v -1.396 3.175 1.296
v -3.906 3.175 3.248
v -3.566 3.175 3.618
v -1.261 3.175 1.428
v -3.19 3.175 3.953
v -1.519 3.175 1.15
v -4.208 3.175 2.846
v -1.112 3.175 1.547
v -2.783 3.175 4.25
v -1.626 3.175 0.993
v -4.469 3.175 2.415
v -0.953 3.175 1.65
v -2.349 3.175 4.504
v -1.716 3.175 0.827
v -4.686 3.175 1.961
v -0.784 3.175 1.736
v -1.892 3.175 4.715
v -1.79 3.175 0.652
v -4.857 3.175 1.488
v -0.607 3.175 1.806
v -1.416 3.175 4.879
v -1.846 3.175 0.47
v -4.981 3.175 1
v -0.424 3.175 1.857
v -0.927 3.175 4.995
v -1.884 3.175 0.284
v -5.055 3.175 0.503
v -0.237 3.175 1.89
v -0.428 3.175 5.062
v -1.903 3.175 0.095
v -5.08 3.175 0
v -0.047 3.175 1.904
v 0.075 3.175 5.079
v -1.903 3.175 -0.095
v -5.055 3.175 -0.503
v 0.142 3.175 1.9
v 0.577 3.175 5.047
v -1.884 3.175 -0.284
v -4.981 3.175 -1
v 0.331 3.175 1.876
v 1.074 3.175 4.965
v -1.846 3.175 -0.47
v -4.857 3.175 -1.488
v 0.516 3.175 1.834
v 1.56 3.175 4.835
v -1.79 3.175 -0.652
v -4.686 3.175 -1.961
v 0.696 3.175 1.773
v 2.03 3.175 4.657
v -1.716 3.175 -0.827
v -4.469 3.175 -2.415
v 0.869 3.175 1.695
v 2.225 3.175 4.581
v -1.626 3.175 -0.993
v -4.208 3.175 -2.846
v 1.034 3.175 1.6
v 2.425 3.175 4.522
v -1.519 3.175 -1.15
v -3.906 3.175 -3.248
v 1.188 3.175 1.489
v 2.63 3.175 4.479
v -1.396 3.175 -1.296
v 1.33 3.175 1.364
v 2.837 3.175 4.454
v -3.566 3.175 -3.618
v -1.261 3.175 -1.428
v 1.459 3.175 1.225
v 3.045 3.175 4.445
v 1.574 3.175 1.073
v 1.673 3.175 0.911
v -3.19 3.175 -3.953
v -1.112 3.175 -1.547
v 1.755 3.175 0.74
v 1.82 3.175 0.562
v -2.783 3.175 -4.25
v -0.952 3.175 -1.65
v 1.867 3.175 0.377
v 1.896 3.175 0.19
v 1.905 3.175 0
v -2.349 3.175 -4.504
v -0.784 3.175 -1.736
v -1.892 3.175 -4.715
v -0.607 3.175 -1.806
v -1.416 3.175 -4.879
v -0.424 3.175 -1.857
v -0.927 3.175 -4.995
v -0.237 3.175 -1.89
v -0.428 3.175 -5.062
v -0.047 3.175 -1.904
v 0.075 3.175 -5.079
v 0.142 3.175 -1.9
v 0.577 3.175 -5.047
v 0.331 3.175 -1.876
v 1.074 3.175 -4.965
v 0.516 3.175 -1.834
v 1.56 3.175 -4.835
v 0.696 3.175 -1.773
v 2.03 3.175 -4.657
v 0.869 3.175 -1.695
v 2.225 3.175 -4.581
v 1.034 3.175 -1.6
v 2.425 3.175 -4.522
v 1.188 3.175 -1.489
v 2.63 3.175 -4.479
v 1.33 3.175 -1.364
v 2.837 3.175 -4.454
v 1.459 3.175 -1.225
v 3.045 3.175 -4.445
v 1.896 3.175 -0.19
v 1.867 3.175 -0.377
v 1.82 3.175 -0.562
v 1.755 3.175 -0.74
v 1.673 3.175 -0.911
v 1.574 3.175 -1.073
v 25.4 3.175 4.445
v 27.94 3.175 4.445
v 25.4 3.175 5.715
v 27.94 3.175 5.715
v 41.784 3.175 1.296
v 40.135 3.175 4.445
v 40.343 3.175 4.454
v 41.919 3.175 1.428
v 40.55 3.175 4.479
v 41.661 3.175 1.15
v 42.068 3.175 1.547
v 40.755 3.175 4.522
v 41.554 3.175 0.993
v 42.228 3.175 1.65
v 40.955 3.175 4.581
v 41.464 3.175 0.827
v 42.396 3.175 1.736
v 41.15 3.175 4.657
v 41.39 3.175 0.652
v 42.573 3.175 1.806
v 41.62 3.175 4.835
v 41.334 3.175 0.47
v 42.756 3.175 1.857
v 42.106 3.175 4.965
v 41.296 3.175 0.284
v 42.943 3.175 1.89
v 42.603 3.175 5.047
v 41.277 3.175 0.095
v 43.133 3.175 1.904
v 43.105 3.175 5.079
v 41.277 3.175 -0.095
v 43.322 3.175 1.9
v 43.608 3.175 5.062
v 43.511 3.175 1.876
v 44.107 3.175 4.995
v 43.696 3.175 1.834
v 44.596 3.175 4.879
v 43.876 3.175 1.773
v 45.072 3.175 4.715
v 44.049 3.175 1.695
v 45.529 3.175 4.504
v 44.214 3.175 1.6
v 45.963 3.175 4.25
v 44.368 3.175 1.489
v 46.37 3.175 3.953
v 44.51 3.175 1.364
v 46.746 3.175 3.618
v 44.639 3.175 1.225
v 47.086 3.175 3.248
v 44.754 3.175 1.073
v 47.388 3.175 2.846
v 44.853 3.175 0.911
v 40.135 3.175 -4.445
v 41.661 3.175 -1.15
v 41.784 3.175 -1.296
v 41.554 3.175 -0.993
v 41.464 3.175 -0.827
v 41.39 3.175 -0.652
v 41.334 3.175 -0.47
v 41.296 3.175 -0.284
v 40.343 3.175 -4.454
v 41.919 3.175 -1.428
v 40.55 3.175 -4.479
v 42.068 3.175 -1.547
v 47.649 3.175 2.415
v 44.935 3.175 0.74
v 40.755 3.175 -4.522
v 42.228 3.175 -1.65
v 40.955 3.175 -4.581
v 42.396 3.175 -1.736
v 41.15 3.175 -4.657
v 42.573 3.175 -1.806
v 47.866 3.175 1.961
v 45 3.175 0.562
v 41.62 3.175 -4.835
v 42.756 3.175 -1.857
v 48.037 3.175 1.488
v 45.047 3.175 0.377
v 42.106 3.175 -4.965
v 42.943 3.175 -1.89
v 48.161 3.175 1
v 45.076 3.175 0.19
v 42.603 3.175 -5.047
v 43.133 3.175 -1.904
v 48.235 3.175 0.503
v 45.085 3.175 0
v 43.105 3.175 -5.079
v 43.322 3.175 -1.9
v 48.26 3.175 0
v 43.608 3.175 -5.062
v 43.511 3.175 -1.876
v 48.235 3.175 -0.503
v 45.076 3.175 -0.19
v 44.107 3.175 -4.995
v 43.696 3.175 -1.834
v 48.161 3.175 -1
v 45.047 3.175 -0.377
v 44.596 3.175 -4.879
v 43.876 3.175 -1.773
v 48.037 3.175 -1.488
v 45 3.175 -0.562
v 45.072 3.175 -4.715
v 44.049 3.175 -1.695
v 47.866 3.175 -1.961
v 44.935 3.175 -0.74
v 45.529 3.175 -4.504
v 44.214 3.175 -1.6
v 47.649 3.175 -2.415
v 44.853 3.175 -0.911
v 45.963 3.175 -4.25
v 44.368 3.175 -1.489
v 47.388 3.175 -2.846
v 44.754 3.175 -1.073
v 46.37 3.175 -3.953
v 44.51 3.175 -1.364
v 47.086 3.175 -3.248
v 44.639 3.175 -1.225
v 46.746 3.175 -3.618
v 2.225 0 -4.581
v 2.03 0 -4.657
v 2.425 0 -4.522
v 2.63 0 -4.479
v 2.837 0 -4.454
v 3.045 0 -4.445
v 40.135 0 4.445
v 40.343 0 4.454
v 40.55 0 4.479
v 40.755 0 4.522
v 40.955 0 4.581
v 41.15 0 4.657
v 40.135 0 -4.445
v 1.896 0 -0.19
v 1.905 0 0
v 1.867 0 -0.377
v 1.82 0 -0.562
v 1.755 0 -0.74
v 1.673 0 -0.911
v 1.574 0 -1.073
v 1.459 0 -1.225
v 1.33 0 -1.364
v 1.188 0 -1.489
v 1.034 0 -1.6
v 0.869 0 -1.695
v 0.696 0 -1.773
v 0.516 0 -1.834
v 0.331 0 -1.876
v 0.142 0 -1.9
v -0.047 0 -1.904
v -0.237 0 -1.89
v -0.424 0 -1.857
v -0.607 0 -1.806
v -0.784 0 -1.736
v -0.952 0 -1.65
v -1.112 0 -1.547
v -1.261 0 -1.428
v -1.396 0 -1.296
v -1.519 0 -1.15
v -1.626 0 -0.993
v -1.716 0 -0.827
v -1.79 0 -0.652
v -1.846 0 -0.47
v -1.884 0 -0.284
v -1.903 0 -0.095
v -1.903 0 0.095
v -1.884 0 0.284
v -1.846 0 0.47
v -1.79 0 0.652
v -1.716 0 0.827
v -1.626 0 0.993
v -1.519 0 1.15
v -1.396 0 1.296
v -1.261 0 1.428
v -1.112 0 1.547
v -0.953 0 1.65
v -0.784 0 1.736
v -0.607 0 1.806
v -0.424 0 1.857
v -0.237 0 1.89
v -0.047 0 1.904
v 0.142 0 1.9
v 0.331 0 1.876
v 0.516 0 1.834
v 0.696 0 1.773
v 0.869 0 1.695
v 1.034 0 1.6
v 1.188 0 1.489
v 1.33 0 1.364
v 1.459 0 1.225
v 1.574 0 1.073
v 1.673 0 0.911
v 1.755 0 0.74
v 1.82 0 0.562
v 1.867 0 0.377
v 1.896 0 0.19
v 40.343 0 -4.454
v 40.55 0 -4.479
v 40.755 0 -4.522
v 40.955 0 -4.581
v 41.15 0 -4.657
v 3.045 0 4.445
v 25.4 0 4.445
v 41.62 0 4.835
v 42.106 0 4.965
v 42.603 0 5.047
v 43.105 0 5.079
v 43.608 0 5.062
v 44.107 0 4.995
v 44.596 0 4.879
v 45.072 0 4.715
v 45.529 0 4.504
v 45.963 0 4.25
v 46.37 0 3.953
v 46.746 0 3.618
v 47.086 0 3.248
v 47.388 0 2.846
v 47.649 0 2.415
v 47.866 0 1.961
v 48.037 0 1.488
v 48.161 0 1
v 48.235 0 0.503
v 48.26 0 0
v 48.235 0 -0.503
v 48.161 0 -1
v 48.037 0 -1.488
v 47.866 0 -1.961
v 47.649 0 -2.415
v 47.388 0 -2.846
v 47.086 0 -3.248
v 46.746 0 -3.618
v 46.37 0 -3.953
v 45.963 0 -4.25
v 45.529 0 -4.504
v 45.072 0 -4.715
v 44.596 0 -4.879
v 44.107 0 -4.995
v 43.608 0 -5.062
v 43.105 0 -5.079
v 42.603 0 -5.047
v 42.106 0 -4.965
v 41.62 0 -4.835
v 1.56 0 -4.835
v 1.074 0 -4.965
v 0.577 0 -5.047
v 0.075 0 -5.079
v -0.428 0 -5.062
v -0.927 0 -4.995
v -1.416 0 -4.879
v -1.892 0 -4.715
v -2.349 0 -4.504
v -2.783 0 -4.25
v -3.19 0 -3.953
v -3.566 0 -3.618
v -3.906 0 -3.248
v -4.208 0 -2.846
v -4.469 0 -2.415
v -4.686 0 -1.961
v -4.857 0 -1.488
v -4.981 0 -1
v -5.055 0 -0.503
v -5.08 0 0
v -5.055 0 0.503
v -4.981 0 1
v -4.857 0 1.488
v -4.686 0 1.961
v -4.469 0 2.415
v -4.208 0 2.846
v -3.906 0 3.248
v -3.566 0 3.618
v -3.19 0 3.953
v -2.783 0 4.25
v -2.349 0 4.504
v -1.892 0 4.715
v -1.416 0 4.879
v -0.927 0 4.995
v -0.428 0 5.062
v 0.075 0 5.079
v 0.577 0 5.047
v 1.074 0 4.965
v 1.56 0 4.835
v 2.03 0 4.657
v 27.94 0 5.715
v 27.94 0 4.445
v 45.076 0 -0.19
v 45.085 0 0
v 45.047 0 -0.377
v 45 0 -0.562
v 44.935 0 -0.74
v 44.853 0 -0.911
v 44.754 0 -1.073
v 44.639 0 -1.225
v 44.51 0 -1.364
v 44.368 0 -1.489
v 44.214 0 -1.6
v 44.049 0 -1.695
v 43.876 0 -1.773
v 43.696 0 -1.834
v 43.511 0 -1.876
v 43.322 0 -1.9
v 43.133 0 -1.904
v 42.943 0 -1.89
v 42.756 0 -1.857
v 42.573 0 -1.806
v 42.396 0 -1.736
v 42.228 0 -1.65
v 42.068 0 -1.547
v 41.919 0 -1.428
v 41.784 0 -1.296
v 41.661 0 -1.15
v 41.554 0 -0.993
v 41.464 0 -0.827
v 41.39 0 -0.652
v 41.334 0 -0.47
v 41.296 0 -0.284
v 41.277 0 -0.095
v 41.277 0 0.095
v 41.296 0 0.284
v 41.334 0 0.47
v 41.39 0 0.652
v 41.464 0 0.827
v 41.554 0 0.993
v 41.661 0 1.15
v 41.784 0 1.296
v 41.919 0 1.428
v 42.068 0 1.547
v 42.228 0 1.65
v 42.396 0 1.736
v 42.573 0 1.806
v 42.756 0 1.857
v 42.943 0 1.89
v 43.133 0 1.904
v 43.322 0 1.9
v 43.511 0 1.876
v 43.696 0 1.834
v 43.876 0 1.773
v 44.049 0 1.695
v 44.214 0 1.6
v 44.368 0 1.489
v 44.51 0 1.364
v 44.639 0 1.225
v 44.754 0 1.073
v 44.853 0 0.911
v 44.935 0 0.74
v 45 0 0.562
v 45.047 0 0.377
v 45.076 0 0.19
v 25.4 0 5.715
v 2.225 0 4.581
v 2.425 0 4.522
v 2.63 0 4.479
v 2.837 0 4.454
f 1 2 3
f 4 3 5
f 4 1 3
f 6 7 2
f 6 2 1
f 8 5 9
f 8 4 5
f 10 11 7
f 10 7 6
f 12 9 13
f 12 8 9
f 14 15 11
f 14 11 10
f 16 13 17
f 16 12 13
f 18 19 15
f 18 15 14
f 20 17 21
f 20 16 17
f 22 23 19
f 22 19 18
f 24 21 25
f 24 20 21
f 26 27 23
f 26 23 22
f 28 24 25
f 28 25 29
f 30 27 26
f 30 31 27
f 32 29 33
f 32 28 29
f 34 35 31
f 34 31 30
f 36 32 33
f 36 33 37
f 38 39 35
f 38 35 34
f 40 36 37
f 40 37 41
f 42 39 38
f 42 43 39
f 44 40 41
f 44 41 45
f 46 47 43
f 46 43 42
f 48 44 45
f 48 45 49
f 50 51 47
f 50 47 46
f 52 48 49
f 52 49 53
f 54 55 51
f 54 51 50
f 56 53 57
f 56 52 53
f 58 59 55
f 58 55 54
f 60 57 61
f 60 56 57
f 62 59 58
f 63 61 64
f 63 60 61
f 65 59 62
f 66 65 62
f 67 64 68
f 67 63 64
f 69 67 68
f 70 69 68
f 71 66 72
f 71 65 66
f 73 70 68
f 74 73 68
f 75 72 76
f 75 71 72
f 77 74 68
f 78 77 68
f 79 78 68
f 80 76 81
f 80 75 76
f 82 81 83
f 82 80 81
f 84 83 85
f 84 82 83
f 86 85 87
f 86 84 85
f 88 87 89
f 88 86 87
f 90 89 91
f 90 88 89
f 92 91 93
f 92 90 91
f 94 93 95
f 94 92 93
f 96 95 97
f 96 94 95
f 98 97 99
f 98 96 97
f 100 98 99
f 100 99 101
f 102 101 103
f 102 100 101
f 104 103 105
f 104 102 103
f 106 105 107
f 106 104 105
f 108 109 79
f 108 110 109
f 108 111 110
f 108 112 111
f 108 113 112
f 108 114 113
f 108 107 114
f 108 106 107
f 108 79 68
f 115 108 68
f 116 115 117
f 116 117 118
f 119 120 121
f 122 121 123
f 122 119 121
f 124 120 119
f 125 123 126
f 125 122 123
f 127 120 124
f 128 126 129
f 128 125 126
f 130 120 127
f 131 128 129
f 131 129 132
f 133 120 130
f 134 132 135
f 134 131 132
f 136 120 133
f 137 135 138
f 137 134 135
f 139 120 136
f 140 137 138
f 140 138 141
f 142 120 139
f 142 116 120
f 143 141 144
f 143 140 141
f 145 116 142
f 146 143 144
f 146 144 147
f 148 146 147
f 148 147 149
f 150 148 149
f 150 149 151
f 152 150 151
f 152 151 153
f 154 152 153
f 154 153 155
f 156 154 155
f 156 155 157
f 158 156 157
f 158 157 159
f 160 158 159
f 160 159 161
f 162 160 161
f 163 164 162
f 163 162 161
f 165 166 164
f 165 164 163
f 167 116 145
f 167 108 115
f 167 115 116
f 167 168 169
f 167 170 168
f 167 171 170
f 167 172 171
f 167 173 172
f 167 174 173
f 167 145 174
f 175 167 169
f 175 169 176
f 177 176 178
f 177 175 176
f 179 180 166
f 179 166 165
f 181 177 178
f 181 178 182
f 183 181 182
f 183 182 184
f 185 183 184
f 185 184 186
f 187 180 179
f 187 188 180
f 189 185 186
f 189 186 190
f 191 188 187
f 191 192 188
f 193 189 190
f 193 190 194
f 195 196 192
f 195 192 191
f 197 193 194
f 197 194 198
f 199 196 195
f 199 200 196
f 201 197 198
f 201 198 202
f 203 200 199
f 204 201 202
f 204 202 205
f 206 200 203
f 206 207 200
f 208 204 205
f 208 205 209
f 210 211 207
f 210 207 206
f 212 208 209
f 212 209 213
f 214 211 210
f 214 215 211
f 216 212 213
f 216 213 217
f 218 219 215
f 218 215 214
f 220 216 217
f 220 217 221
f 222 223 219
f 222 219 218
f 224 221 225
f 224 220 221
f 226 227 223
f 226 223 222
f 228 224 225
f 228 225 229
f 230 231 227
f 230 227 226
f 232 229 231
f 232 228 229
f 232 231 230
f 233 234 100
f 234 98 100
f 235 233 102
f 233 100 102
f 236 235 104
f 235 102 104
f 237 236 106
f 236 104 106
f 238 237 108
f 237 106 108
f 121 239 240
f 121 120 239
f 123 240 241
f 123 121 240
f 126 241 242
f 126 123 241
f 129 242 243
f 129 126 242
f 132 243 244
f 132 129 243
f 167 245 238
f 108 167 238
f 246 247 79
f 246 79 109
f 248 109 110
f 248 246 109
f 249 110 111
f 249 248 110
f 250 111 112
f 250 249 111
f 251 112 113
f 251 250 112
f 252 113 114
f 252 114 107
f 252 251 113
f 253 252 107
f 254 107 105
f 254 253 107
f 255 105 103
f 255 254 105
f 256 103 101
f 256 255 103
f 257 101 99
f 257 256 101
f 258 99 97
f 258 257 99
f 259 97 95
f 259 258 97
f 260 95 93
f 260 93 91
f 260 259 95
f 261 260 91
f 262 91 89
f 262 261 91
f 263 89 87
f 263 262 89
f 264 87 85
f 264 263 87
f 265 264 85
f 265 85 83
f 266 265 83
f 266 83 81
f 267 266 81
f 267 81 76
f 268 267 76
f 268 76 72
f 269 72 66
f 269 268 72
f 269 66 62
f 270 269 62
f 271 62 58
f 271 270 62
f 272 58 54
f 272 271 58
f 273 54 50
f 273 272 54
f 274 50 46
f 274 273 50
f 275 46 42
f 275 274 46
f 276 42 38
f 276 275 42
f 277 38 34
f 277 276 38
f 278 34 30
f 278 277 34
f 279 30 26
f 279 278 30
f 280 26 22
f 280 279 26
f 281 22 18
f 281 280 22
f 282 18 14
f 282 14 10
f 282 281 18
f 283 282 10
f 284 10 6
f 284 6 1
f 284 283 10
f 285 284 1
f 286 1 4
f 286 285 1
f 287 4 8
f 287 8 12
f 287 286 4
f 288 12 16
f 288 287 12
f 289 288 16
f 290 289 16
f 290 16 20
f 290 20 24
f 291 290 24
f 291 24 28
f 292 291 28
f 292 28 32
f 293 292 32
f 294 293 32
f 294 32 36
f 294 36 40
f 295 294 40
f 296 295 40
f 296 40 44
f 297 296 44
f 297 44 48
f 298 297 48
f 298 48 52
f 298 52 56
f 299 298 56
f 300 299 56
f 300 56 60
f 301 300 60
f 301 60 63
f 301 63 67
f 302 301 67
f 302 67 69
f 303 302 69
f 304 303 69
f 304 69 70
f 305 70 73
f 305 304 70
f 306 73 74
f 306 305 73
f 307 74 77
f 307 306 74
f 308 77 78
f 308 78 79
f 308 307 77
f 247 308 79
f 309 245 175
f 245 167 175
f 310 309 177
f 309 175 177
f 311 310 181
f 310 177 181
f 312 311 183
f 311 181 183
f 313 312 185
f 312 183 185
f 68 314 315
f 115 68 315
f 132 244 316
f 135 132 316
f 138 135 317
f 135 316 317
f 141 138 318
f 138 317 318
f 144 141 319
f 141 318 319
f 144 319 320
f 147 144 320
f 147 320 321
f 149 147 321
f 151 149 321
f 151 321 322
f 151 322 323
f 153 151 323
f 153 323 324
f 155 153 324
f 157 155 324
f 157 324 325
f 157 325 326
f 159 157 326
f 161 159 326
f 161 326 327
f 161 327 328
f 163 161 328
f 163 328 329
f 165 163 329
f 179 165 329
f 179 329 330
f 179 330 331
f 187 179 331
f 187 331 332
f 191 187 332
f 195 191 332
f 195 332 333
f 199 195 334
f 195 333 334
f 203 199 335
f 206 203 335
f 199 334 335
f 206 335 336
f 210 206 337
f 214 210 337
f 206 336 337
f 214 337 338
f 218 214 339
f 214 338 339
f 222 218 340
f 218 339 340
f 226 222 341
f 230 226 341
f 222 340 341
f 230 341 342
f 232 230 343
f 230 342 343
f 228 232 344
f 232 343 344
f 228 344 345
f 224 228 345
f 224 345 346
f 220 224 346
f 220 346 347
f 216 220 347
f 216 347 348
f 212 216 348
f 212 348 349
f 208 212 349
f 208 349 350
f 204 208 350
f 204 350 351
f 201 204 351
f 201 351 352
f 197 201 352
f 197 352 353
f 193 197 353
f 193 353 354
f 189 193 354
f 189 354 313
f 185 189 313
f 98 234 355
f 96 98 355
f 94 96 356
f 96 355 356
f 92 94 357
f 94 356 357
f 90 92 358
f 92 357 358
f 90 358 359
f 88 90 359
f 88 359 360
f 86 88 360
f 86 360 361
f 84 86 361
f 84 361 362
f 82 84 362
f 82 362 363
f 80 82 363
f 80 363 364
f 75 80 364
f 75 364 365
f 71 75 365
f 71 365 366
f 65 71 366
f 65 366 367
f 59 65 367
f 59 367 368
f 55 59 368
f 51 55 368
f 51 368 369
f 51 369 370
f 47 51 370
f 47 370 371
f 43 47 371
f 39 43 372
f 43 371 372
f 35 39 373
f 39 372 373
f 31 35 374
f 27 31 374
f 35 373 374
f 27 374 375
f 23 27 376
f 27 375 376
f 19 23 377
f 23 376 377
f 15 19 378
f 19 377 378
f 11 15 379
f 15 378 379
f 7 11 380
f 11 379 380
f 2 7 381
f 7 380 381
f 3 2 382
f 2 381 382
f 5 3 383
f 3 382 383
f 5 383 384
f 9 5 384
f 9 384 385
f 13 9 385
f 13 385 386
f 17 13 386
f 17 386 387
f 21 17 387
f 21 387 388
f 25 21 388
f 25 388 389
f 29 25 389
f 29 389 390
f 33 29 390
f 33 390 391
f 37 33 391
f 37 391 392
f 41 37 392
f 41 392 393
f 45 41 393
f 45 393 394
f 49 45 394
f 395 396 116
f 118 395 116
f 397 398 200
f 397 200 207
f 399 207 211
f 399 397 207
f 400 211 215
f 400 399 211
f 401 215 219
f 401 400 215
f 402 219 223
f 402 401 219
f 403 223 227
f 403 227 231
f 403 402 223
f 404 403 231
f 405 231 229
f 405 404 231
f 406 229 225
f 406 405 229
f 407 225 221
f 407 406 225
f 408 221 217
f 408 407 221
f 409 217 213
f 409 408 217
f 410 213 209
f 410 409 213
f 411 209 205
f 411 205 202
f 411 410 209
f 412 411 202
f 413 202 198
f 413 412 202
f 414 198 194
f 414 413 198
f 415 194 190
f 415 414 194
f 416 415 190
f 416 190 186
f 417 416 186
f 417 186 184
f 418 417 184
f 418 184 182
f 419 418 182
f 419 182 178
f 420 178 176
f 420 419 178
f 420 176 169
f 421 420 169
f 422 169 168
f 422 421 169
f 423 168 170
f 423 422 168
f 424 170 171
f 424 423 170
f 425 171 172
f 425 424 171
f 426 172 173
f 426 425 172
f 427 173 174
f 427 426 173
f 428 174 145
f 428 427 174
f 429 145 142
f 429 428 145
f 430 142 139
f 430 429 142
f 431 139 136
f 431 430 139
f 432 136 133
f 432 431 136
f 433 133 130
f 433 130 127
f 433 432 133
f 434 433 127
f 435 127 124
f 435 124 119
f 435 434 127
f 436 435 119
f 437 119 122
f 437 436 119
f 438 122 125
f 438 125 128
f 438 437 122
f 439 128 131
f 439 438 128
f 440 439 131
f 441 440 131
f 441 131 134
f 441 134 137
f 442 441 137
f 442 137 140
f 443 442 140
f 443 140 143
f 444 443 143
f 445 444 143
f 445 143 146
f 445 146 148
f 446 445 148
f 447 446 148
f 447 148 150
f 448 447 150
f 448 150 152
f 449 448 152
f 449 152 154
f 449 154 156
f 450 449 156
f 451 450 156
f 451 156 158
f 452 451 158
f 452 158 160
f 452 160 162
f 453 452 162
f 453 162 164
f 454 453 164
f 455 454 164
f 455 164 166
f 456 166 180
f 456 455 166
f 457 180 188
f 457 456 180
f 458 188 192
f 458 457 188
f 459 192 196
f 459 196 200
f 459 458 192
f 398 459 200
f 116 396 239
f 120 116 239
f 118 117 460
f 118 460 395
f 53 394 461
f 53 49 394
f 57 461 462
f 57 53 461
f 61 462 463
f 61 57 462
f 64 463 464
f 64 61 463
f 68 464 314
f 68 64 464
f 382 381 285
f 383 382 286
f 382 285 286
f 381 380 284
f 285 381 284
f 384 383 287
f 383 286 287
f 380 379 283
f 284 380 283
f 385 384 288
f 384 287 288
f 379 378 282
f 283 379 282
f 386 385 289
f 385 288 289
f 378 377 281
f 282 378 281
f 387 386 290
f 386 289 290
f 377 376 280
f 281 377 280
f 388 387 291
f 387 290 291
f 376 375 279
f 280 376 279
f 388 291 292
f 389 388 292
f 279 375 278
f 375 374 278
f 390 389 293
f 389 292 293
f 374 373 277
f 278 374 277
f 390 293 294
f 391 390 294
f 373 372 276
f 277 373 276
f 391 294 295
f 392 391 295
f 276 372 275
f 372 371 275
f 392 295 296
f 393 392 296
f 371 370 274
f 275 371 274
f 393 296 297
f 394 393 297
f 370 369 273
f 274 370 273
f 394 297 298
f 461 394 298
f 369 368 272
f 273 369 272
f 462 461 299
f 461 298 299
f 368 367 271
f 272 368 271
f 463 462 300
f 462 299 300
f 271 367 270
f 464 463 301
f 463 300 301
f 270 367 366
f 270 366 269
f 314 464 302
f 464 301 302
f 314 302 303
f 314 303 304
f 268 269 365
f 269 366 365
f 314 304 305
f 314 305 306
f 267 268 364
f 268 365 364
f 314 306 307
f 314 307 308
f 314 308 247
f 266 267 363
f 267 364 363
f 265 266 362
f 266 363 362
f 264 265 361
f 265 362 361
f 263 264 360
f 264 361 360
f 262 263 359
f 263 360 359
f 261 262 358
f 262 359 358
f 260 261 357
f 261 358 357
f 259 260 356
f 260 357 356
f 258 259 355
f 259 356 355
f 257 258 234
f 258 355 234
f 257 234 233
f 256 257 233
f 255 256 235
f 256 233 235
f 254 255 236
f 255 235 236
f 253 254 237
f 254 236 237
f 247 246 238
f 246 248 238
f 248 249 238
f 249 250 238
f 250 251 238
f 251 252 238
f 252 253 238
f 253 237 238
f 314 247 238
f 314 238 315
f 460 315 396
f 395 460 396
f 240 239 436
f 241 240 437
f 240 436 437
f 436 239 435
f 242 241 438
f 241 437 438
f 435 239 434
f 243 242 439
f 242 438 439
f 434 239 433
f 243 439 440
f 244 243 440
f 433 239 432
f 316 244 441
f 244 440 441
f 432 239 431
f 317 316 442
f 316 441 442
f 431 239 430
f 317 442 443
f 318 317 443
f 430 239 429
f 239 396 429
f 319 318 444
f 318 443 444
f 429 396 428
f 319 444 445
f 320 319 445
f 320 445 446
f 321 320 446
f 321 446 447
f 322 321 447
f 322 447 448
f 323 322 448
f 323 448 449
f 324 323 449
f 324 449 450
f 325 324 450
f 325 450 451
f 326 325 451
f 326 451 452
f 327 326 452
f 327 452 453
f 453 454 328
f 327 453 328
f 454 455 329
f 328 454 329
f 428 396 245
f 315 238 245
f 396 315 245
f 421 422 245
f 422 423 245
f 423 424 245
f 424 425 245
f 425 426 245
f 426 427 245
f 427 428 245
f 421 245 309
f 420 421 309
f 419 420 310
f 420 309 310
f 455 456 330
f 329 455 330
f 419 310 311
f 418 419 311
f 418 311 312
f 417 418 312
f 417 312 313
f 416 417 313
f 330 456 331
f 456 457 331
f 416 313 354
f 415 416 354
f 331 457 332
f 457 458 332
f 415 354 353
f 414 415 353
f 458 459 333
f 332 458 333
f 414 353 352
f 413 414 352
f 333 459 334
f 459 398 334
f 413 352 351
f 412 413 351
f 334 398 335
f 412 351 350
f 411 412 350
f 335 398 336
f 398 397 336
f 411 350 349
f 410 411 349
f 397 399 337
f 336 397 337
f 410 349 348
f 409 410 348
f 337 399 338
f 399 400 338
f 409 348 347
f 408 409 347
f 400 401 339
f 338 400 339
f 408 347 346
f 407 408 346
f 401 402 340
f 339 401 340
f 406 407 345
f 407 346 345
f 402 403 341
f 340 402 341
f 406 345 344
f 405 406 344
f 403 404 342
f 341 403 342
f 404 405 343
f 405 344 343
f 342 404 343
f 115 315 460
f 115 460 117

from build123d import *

# Parameters (mm, degrees)
SKETCH1_R           = 5.08
SKETCH1_R_2         = 1.905
BOSS_EXTRUDE1_DEPTH = 3.175
FILLET1_R           = 2.54
SKETCH2_W           = 2.54
SKETCH2_H           = 3.175
BOSS_EXTRUDE2_DEPTH = 1.27


with BuildPart() as part:
    # Sketch1 → Boss-Extrude1 (new body)
    with BuildSketch(Plane(origin=(0, 0, 0), x_dir=(1, 0, 0), z_dir=(0, 1, 0))):
        Circle(SKETCH1_R)
        Circle(SKETCH1_R_2, mode=Mode.SUBTRACT)
        with BuildLine():
            Line((40.720655575, 4.445), (2.459344425, 4.445))
            ThreePointArc((2.459344425, 4.445), (4.376063852, 2.580012628), (5.08, 0))
            ThreePointArc((5.08, 0), (4.376063852, -2.580012628), (2.459344425, -4.445))
            Line((2.459344425, -4.445), (40.720655575, -4.445))
            ThreePointArc((40.720655575, -4.445), (38.1, 0), (40.720655575, 4.445))
        make_face()
        with Locations((43.18, 0)):
            Circle(SKETCH1_R)
        with Locations((43.18, 0)):
            Circle(SKETCH1_R_2, mode=Mode.SUBTRACT)
    extrude(amount=BOSS_EXTRUDE1_DEPTH)

    # Fillet1
    fillet1_edges = [part.edges().sort_by_distance(p)[0] for p in [
        (2.459344425, 1.5875, -4.445),
        (40.720655575, 1.5875, -4.445),
        (40.720655575, 1.5875, 4.445),
        (2.459344425, 1.5875, 4.445),
    ]]
    fillet(fillet1_edges, radius=FILLET1_R)

    # Sketch2 → Boss-Extrude2 (add)
    with BuildSketch(Plane.XY.offset(4.445)):
        with Locations((26.67, 1.5875)):
            Rectangle(SKETCH2_W, SKETCH2_H)
    extrude(amount=BOSS_EXTRUDE2_DEPTH)


solid = part.part
